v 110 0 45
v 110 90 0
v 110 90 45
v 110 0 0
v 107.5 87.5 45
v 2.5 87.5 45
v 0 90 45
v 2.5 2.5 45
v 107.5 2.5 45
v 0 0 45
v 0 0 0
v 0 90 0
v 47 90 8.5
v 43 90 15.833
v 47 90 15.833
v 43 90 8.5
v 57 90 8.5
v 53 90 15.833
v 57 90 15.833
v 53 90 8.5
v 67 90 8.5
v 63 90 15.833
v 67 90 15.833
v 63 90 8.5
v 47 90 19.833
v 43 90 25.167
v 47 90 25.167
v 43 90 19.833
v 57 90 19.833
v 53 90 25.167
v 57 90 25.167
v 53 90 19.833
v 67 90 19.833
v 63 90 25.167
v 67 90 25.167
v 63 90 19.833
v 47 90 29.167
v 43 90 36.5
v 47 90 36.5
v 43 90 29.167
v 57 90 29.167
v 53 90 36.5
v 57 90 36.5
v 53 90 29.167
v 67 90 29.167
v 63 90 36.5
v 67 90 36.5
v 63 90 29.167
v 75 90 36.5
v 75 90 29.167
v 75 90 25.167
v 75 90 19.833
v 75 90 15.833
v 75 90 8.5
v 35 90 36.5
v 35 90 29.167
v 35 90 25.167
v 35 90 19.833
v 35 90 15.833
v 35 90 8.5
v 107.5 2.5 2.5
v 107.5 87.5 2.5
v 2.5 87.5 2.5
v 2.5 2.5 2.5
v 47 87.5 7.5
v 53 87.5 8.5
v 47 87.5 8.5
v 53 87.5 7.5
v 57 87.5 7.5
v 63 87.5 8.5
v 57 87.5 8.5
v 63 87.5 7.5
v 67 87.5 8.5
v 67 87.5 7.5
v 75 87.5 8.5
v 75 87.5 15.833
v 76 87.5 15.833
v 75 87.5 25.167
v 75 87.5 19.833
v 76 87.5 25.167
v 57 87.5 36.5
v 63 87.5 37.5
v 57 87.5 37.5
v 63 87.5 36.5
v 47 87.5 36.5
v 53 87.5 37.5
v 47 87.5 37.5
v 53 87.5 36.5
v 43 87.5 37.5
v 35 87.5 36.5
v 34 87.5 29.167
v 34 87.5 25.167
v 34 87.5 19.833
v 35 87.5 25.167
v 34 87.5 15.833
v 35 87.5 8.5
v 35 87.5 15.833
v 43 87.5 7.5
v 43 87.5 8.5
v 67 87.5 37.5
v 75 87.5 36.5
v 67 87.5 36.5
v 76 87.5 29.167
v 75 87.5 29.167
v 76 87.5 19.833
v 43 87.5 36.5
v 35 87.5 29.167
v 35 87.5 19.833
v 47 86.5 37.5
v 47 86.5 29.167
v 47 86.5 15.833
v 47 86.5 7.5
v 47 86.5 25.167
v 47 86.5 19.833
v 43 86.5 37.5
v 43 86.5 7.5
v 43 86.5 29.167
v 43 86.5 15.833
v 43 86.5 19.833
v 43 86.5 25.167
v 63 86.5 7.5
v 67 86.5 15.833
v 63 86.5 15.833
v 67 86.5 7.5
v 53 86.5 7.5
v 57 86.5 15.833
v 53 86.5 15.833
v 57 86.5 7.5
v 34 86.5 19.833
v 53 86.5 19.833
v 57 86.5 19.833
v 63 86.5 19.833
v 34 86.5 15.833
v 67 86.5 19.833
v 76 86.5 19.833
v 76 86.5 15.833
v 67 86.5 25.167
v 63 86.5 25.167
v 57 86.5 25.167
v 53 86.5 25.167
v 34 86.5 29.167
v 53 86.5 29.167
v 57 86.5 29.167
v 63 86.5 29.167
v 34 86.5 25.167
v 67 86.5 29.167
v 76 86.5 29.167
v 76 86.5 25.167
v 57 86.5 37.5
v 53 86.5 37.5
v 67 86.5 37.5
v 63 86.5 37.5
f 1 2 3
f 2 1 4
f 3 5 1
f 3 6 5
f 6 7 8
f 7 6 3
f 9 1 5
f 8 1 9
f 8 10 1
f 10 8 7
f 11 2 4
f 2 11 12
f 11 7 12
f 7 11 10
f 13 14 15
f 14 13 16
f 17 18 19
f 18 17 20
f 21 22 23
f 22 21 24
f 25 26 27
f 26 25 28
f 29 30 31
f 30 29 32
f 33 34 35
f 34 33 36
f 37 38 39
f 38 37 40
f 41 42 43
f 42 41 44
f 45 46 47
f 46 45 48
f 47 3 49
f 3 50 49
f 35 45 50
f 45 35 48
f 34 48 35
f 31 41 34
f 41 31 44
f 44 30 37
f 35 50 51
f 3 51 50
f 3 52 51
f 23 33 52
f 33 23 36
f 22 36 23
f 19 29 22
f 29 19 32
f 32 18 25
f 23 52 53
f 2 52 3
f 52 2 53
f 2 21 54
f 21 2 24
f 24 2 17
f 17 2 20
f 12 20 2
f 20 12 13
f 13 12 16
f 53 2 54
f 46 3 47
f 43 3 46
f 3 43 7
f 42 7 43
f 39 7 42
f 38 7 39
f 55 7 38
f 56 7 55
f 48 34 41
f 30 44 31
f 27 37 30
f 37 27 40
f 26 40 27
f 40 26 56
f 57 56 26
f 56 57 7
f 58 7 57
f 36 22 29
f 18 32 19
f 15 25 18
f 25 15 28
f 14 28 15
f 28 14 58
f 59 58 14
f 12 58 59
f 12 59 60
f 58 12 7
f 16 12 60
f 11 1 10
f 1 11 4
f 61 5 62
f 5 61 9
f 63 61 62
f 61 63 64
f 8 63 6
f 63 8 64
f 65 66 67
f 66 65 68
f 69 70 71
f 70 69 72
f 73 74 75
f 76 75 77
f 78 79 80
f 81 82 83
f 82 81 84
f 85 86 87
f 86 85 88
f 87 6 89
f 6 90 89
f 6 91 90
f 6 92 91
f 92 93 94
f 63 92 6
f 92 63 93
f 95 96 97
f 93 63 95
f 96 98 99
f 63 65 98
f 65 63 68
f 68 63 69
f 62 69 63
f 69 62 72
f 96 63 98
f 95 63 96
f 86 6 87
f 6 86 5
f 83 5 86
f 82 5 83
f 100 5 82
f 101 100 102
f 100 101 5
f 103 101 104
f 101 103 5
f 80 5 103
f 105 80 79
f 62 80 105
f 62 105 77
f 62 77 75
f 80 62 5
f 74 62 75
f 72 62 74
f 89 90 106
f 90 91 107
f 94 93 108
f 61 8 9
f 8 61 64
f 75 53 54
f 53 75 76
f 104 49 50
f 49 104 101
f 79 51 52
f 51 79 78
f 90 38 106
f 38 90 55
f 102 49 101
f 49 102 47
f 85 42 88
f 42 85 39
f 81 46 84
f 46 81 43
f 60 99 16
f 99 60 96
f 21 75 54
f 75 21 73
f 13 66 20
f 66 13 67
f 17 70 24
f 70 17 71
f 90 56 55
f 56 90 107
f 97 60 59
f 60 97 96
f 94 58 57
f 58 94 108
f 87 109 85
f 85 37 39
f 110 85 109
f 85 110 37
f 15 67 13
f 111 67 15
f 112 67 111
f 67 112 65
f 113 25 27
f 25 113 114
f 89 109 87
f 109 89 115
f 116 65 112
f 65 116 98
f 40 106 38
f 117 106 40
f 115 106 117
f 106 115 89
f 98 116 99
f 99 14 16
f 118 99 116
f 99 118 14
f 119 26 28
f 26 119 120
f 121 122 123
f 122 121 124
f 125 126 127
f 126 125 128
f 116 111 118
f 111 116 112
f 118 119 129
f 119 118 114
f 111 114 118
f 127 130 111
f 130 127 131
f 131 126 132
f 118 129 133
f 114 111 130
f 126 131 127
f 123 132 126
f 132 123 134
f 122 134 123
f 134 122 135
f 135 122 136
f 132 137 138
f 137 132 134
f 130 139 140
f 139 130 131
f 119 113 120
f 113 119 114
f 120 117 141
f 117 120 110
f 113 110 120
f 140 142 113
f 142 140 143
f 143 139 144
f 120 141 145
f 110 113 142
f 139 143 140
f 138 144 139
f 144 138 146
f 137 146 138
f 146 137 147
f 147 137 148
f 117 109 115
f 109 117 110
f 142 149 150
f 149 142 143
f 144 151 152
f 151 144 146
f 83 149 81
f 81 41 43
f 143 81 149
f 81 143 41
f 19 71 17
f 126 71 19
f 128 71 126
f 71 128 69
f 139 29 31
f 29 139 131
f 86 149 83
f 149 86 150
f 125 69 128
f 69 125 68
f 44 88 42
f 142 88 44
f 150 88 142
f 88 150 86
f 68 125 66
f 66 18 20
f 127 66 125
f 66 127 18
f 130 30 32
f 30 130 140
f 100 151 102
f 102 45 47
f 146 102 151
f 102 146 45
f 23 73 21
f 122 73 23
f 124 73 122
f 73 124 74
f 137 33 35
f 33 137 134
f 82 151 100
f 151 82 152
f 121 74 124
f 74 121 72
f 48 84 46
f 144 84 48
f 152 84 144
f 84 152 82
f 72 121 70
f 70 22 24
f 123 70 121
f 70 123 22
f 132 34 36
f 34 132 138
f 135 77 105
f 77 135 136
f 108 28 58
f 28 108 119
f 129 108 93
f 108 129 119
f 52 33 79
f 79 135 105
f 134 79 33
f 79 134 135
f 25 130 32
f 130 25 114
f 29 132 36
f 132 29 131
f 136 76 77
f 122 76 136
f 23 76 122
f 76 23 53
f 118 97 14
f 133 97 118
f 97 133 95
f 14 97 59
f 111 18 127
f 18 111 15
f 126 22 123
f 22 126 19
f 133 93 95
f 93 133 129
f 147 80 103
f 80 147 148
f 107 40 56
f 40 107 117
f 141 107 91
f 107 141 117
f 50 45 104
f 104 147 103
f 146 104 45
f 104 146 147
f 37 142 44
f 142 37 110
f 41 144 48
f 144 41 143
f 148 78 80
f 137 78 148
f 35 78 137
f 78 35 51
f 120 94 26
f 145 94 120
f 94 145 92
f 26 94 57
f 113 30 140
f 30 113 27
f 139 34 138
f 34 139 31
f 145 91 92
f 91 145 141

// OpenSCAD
$fn = 32;

// ----------------------------------------------------------------------
// Vent box: crossgrid enclosure
// ----------------------------------------------------------------------

// --- parameters (mm) ---
box_l = 110;              // box length, X
box_w = 90;               // box width, Y
box_h = 45;               // box height, Z
wall_t = 2.5;             // shell wall thickness
win_l = 40;               // vent window width, X
win_h = 28;               // vent window height, Z
bar_w = 4;                // grid bar width
n_v = 3;                  // vertical bar count
n_h = 2;                  // horizontal bar count

win_z0 = (box_h - win_h) / 2;  // window lower edge Z
v_step = win_l / (n_v + 1);  // vertical bar step
h_step = win_h / (n_h + 1);  // horizontal bar step

difference() {
  union() {
    difference() {
      cube([box_l, box_w, box_h]);
  translate([wall_t, wall_t, wall_t])
    cube([box_l - 2 * wall_t, box_w - 2 * wall_t, box_h]);
  translate([(box_l - win_l) / 2, box_w - wall_t - 1, win_z0])
    cube([win_l, wall_t + 2, win_h]);
    }
    for (i = [1 : n_v])
      translate([(box_l - win_l) / 2 + i * v_step - bar_w / 2,
                 box_w - wall_t - 1, win_z0 - 1])
        cube([bar_w, wall_t + 1, win_h + 2]);
    for (i = [1 : n_h])
      translate([(box_l - win_l) / 2 - 1, box_w - wall_t - 1,
                 win_z0 + i * h_step - bar_w / 2])
        cube([win_l + 2, wall_t + 1, bar_w]);
  }
}
